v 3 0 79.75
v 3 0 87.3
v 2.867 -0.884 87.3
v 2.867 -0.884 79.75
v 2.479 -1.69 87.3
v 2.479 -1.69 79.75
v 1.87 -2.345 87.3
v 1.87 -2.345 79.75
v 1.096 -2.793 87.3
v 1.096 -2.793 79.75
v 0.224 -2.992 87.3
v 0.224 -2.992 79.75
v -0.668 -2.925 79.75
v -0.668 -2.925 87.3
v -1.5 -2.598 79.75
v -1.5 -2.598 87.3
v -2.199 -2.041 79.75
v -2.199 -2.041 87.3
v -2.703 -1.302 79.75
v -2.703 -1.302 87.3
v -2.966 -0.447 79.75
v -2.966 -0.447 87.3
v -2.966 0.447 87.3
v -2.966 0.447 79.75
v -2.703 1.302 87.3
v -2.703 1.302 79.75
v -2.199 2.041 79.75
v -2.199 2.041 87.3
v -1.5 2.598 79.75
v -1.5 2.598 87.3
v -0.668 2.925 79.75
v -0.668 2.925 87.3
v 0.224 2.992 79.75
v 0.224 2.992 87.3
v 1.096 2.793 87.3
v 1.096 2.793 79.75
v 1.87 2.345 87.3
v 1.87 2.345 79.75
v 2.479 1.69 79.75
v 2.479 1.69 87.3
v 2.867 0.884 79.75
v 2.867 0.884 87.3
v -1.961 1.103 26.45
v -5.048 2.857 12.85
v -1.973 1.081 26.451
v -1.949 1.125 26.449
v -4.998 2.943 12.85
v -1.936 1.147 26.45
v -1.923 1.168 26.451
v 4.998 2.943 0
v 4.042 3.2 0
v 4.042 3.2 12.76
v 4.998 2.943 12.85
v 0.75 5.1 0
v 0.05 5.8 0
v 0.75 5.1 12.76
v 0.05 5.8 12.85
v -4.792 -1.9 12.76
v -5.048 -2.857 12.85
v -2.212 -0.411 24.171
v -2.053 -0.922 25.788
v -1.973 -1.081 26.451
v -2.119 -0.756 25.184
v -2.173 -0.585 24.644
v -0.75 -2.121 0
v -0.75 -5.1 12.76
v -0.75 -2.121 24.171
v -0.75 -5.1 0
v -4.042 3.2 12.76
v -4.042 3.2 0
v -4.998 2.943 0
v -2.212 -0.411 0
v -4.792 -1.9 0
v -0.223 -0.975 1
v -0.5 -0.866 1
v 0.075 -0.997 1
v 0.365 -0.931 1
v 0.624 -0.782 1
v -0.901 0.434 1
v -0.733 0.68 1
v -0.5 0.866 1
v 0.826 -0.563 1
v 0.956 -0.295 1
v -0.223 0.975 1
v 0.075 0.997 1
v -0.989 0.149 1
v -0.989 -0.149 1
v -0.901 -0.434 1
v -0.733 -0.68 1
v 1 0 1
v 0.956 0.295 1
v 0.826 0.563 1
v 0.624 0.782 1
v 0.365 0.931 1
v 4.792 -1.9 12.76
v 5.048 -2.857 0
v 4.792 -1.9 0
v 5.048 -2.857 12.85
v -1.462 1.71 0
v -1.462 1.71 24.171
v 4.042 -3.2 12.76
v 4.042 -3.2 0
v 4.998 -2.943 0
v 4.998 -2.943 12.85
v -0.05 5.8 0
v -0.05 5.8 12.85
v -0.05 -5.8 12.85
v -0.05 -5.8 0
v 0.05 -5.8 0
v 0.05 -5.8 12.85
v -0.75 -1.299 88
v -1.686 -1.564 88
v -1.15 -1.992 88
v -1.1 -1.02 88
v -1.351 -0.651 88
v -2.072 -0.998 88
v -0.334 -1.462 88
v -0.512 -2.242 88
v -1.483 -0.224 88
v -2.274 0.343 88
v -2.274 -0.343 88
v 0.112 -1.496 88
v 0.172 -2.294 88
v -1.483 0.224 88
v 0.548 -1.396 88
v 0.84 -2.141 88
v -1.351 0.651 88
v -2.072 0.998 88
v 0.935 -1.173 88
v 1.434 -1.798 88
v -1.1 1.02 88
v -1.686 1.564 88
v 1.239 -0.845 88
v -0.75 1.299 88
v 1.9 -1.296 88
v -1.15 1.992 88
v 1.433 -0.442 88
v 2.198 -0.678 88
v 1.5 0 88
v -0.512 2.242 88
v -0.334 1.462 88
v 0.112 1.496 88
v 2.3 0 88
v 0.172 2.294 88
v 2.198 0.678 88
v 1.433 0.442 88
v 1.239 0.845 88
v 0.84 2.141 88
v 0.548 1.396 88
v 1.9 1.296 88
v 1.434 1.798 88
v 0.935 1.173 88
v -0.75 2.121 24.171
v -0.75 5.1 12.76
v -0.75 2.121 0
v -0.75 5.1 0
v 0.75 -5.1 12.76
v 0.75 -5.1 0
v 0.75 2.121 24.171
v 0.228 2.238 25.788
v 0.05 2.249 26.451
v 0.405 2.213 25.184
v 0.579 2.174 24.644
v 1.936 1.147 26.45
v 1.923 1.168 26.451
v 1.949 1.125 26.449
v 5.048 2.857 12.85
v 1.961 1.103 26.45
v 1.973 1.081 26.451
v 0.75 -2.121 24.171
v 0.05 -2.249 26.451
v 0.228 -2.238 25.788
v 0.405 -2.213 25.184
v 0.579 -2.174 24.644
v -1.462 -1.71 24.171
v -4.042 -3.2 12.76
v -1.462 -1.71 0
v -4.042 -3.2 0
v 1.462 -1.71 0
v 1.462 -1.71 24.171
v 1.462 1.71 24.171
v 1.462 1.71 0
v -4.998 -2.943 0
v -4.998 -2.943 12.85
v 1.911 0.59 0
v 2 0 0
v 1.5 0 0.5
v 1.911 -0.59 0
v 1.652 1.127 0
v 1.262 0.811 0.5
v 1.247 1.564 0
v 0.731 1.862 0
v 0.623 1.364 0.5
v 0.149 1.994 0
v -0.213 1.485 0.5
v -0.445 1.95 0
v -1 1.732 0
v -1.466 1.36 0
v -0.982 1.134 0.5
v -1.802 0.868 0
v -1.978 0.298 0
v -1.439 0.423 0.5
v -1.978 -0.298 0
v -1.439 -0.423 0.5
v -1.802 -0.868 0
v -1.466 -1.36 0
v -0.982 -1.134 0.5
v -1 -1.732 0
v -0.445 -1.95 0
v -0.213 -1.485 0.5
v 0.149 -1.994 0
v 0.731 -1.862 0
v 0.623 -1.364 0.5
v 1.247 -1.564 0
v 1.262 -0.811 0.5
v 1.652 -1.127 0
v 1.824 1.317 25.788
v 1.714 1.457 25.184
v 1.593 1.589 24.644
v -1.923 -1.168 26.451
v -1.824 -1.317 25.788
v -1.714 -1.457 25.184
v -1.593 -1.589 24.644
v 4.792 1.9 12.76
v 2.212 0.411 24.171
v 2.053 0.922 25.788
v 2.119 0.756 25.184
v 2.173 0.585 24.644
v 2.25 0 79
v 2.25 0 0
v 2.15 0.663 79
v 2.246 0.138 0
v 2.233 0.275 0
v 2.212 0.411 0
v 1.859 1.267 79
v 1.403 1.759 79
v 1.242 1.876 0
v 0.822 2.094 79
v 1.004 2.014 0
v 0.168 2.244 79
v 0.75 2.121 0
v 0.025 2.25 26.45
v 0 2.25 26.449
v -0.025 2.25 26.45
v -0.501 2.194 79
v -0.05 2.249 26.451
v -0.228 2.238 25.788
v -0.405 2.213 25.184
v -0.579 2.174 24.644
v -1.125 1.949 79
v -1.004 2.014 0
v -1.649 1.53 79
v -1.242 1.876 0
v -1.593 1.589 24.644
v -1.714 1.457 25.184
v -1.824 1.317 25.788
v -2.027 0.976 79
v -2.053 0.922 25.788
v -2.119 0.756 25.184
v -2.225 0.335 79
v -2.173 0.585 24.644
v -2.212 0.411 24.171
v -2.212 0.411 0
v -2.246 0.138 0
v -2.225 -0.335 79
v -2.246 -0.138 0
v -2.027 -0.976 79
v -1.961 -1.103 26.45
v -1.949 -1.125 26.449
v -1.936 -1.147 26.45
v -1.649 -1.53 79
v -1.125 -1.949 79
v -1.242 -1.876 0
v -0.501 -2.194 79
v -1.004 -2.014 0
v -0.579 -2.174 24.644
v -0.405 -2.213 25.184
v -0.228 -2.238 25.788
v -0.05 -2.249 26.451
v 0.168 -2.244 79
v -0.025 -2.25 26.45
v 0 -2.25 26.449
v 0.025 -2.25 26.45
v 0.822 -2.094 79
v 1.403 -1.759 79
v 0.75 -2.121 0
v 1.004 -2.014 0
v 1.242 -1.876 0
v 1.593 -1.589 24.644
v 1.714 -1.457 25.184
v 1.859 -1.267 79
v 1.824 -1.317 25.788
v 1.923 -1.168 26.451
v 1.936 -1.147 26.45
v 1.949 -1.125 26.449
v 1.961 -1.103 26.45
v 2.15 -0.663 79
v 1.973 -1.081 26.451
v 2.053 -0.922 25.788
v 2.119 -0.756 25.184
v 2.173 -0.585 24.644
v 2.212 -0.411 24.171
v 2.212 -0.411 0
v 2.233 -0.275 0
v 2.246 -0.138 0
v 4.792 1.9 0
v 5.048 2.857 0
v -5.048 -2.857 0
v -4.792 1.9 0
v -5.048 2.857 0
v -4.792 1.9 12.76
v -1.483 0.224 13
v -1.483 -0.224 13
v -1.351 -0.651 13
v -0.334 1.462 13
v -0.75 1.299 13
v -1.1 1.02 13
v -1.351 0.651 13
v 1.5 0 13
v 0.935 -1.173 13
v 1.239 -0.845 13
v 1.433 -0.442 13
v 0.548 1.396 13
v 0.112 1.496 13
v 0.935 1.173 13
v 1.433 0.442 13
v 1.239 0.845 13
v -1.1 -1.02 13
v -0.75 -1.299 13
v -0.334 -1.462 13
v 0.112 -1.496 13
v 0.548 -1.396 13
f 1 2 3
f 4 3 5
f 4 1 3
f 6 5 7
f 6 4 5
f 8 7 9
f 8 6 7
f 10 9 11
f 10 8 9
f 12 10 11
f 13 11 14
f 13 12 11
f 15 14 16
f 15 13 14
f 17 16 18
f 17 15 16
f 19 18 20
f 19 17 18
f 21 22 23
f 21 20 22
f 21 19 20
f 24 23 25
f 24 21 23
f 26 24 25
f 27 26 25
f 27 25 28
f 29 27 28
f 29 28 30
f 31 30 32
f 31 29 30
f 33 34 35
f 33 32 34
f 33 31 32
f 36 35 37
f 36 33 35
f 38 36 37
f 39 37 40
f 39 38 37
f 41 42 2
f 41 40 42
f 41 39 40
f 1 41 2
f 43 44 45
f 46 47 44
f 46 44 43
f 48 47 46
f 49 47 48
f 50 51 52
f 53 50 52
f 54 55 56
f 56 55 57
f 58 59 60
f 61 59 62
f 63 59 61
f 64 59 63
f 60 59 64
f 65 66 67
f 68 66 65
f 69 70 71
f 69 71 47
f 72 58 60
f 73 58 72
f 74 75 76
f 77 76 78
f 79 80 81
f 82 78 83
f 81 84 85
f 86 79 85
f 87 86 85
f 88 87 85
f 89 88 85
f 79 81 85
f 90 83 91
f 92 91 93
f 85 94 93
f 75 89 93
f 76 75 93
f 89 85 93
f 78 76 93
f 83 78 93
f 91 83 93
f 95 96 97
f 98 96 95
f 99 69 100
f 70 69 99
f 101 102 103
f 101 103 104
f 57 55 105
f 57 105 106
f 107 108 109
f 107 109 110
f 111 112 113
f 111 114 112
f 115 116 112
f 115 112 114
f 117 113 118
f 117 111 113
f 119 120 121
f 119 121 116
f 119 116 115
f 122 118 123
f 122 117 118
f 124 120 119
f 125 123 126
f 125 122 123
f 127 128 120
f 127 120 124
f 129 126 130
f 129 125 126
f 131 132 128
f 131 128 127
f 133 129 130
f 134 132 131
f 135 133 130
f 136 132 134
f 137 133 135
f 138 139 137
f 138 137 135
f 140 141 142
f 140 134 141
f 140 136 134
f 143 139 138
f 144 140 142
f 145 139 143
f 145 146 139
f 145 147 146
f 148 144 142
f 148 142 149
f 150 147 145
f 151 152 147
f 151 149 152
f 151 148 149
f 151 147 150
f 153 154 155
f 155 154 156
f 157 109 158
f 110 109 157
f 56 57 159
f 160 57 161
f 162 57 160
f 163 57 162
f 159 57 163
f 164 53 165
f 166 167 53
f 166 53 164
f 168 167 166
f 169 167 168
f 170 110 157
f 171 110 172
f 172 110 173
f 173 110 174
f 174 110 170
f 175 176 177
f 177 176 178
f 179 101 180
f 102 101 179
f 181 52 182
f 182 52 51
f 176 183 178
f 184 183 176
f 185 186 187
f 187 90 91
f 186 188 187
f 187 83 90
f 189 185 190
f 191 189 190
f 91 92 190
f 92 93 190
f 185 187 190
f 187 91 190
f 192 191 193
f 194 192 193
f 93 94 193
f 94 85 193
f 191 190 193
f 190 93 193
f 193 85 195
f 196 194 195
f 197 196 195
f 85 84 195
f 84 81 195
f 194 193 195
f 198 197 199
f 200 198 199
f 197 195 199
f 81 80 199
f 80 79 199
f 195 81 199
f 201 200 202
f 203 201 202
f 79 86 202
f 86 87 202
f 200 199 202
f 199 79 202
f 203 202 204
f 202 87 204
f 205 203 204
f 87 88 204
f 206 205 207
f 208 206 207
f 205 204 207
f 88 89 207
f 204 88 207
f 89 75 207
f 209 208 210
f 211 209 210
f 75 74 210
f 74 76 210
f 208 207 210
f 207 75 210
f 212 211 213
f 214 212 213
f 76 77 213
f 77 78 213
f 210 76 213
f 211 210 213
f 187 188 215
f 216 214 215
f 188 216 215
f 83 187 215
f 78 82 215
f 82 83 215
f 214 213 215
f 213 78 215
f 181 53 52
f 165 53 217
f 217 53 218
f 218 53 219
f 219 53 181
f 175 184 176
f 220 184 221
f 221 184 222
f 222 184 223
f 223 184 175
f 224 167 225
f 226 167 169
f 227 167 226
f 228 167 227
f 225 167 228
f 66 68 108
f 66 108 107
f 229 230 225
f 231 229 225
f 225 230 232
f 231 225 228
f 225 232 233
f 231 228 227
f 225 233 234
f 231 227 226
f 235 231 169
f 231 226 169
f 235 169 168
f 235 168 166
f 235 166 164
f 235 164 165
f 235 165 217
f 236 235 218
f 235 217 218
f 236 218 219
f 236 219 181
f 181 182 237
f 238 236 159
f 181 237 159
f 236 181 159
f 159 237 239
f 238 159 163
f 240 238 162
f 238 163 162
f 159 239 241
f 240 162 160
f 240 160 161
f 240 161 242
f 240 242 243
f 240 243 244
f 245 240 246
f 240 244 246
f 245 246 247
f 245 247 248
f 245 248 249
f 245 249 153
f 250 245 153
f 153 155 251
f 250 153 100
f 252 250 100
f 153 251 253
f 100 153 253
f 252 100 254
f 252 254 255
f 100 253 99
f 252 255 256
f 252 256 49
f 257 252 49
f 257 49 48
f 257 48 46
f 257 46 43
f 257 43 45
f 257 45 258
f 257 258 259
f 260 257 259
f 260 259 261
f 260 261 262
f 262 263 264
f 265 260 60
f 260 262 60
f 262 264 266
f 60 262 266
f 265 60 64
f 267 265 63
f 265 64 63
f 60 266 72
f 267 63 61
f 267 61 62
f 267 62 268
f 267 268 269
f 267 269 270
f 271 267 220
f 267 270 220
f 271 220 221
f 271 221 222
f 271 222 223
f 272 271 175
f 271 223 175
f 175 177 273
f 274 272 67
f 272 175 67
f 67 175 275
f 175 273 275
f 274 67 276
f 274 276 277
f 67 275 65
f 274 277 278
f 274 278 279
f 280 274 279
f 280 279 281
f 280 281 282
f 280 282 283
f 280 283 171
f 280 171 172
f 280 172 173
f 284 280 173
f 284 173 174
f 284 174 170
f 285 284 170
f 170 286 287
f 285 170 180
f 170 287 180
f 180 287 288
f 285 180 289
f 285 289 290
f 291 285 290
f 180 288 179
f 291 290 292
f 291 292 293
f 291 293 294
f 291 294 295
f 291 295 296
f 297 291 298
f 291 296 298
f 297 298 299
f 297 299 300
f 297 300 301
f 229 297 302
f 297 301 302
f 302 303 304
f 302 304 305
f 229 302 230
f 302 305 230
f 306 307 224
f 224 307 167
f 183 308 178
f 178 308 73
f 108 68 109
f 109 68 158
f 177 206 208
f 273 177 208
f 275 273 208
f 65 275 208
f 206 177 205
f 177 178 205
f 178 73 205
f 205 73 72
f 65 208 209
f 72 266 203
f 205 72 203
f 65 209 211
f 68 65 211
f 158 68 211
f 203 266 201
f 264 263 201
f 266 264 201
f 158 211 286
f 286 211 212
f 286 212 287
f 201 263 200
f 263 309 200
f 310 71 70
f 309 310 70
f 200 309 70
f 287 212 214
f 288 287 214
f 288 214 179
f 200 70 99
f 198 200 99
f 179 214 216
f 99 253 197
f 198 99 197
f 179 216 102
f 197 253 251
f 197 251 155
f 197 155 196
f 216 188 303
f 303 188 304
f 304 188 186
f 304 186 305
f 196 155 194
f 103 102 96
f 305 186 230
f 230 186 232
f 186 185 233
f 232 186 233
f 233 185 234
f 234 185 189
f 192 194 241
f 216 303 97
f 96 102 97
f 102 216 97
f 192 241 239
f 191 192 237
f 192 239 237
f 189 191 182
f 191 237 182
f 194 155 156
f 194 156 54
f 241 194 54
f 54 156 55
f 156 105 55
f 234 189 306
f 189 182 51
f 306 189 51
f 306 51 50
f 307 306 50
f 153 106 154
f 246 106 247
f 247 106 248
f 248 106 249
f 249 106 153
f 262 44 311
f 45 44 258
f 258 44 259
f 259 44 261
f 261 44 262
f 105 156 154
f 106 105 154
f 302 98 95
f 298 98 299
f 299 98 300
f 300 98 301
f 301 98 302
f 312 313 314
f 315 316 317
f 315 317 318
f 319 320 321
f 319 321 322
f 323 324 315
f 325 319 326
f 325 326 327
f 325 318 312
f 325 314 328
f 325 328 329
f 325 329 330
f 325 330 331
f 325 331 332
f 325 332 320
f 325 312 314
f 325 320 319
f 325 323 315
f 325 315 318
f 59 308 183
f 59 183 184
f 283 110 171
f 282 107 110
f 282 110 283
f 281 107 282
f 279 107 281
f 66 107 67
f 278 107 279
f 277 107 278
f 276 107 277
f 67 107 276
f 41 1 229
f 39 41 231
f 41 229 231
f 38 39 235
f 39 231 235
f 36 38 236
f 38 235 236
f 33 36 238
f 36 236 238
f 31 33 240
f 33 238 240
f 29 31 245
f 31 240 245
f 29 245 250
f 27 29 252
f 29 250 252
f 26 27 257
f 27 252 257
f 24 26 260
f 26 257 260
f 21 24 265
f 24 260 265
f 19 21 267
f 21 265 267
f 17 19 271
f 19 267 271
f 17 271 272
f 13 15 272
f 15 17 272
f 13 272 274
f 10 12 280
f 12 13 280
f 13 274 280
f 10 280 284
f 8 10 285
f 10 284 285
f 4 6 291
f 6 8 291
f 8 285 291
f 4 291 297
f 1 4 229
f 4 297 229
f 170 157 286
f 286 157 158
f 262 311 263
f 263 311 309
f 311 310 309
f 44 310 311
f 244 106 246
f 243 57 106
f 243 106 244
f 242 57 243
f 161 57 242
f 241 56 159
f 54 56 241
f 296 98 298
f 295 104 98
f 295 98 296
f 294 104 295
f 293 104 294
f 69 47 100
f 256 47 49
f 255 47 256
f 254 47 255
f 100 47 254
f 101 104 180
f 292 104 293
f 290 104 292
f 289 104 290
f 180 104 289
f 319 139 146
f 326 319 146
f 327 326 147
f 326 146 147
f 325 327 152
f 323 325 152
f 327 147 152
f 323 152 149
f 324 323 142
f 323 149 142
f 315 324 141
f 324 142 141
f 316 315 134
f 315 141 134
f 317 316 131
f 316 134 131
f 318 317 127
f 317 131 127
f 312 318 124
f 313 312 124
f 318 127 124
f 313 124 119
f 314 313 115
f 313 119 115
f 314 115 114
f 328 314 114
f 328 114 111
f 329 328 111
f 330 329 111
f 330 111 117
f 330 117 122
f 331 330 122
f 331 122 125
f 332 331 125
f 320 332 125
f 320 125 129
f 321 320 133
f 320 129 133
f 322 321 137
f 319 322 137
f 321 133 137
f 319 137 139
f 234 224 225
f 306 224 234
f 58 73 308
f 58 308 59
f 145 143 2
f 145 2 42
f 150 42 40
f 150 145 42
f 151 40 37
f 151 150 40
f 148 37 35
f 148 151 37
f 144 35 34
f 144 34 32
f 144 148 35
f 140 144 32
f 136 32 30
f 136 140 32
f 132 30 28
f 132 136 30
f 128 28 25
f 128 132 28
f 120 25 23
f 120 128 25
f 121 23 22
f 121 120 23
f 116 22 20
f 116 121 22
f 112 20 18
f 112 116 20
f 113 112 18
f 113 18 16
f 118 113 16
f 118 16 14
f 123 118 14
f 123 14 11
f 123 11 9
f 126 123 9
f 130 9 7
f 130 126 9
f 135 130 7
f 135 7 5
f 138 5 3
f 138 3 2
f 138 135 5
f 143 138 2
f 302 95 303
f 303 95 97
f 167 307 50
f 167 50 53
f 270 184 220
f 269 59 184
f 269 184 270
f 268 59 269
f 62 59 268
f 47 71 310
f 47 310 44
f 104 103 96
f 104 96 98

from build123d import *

# Parameters (mm, degrees)
SKETCH_1_R                           = 2.25
EXTRUDE_1_DEPTH                      = 80
EXTRUDE_3_DEPTH                      = 0.75
CHAMFER_4_SIZE                       = 0.7
PATTERN_CIRCULAR_1_COUNT             = 6
CHAMFER_4_OF_PATTERN_CIRCULAR_1_SIZE = 0.7
SKETCH_7_R                           = 3
EXTRUDE_4_DEPTH                      = 8
CHAMFER_6_SIZE                       = 1
CHAMFER_7_SIZE                       = 0.7
SKETCH_8_R                           = 1.5
CUT_EXTRUDE_3_DEPTH                  = 75
SKETCH_9_R                           = 2
CUT_EXTRUDE_4_DEPTH                  = 1
CHAMFER_8_SIZE                       = 1


# Some blends are built 0.0001 mm under size
with BuildPart() as part:
    # 스케치1 → 보스-돌출1 (new body)
    with BuildSketch(Plane.XY):
        Circle(SKETCH_1_R)
    extrude(amount=EXTRUDE_1_DEPTH)

    # 스케치5 → 보스-돌출3 (add, symmetric)
    with BuildSketch(Plane(origin=(0, 0, 0), x_dir=(0, 0, -1), z_dir=(1, 0, 0))):
        Polygon((0, 1.323110618), (0, 5.8), (-12.84952222, 5.8), (-30, 1.323110618), align=None)
    extrude_3 = extrude(amount=EXTRUDE_3_DEPTH, both=True)

    # 모따기4
    chamfer_4_edges = [part.edges().sort_by_distance(p)[0] for p in [
        (-0.75, 3.960660172, 19.895833657),
        (-0.75, 5.8, 6.42476111),
        (0.75, 5.8, 6.42476111),
        (0.75, 3.960660172, 19.895833657),
    ]]
    chamfer(chamfer_4_edges, length=CHAMFER_4_SIZE)

    # 원형 패턴1: 보스-돌출3 ×6 about axis
    pattern_circular_1_axis = Axis((0, 0, 0), (0, 0, 1))
    for i in range(1, PATTERN_CIRCULAR_1_COUNT):
        add(extrude_3.rotate(pattern_circular_1_axis, i * 360 / PATTERN_CIRCULAR_1_COUNT))

    # 모따기4 of 원형 패턴1
    chamfer_4_of_pattern_circular_1_edges = [part.edges().sort_by_distance(p)[0] for p in [
        (-3.805032325, 1.330811033, 19.895833657),
        (-5.397947342, 2.250480947, 6.42476111),
        (-4.647947342, 3.549519053, 6.42476111),
        (-3.055032325, 2.629849139, 19.895833657),
        (-3.055032325, -2.629849139, 19.895833657),
        (-4.647947342, -3.549519053, 6.42476111),
        (-5.397947342, -2.250480947, 6.42476111),
        (-3.805032325, -1.330811033, 19.895833657),
        (0.75, -3.960660172, 19.895833657),
        (0.75, -5.8, 6.42476111),
        (-0.75, -5.8, 6.42476111),
        (-0.75, -3.960660172, 19.895833657),
        (3.805032325, -1.330811033, 19.895833657),
        (5.397947342, -2.250480947, 6.42476111),
        (4.647947342, -3.549519053, 6.42476111),
        (3.055032325, -2.629849139, 19.895833657),
        (3.055032325, 2.629849139, 19.895833657),
        (4.647947342, 3.549519053, 6.42476111),
        (5.397947342, 2.250480947, 6.42476111),
        (3.805032325, 1.330811033, 19.895833657),
    ]]
    chamfer(chamfer_4_of_pattern_circular_1_edges, length=CHAMFER_4_OF_PATTERN_CIRCULAR_1_SIZE)

    # 스케치7 → 보스-돌출4 (add)
    with BuildSketch(Plane.XY.offset(80)):
        Circle(SKETCH_7_R)
    extrude(amount=EXTRUDE_4_DEPTH)

    # 모따기6
    # the kernel refuses this chamfer: 1 mm, written as the material it adds along each edge
    with BuildSketch(Plane(origin=(0, 0, 80), x_dir=(1, 0, 0), z_dir=(0, -1, 0))) as chamfer_6_piece_1_section:
        Polygon((2.25 + CHAMFER_6_SIZE, 0), (2.25, -CHAMFER_6_SIZE), (2.25, 0), align=None)
    chamfer_6_piece_1 = revolve(axis=Axis((0, 0, 80), (0, 0, 1)), mode=Mode.PRIVATE)
    chamfer_6_piece_1 = chamfer_6_piece_1 & Plane(origin=(0, 0, 79.375065252), x_dir=(1, 0, 0), z_dir=(0, 0, -1)) * Cylinder(3, 13, mode=Mode.PRIVATE)
    add(chamfer_6_piece_1)

    # 모따기7
    chamfer_7_edges = [part.edges().sort_by_distance(p)[0] for p in [
        (-3, 0, 88),
    ]]
    chamfer(chamfer_7_edges, length=CHAMFER_7_SIZE)

    # 스케치8 → 컷-돌출3 (cut)
    with BuildSketch(Plane.XY.offset(88)):
        Circle(SKETCH_8_R)
    extrude(amount=-CUT_EXTRUDE_3_DEPTH, mode=Mode.SUBTRACT)

    # 스케치9 → 컷-돌출4 (cut)
    with BuildSketch(Plane.XY):
        Circle(SKETCH_9_R)
    extrude(amount=CUT_EXTRUDE_4_DEPTH, mode=Mode.SUBTRACT)

    # 모따기8
    chamfer_8_edges = [part.edges().sort_by_distance(p)[0] for p in [
        (-2, 0, 1),
    ]]
    chamfer(chamfer_8_edges, length=CHAMFER_8_SIZE - 0.0001)  # a hair under: the kernel refuses the full size


solid = part.part
